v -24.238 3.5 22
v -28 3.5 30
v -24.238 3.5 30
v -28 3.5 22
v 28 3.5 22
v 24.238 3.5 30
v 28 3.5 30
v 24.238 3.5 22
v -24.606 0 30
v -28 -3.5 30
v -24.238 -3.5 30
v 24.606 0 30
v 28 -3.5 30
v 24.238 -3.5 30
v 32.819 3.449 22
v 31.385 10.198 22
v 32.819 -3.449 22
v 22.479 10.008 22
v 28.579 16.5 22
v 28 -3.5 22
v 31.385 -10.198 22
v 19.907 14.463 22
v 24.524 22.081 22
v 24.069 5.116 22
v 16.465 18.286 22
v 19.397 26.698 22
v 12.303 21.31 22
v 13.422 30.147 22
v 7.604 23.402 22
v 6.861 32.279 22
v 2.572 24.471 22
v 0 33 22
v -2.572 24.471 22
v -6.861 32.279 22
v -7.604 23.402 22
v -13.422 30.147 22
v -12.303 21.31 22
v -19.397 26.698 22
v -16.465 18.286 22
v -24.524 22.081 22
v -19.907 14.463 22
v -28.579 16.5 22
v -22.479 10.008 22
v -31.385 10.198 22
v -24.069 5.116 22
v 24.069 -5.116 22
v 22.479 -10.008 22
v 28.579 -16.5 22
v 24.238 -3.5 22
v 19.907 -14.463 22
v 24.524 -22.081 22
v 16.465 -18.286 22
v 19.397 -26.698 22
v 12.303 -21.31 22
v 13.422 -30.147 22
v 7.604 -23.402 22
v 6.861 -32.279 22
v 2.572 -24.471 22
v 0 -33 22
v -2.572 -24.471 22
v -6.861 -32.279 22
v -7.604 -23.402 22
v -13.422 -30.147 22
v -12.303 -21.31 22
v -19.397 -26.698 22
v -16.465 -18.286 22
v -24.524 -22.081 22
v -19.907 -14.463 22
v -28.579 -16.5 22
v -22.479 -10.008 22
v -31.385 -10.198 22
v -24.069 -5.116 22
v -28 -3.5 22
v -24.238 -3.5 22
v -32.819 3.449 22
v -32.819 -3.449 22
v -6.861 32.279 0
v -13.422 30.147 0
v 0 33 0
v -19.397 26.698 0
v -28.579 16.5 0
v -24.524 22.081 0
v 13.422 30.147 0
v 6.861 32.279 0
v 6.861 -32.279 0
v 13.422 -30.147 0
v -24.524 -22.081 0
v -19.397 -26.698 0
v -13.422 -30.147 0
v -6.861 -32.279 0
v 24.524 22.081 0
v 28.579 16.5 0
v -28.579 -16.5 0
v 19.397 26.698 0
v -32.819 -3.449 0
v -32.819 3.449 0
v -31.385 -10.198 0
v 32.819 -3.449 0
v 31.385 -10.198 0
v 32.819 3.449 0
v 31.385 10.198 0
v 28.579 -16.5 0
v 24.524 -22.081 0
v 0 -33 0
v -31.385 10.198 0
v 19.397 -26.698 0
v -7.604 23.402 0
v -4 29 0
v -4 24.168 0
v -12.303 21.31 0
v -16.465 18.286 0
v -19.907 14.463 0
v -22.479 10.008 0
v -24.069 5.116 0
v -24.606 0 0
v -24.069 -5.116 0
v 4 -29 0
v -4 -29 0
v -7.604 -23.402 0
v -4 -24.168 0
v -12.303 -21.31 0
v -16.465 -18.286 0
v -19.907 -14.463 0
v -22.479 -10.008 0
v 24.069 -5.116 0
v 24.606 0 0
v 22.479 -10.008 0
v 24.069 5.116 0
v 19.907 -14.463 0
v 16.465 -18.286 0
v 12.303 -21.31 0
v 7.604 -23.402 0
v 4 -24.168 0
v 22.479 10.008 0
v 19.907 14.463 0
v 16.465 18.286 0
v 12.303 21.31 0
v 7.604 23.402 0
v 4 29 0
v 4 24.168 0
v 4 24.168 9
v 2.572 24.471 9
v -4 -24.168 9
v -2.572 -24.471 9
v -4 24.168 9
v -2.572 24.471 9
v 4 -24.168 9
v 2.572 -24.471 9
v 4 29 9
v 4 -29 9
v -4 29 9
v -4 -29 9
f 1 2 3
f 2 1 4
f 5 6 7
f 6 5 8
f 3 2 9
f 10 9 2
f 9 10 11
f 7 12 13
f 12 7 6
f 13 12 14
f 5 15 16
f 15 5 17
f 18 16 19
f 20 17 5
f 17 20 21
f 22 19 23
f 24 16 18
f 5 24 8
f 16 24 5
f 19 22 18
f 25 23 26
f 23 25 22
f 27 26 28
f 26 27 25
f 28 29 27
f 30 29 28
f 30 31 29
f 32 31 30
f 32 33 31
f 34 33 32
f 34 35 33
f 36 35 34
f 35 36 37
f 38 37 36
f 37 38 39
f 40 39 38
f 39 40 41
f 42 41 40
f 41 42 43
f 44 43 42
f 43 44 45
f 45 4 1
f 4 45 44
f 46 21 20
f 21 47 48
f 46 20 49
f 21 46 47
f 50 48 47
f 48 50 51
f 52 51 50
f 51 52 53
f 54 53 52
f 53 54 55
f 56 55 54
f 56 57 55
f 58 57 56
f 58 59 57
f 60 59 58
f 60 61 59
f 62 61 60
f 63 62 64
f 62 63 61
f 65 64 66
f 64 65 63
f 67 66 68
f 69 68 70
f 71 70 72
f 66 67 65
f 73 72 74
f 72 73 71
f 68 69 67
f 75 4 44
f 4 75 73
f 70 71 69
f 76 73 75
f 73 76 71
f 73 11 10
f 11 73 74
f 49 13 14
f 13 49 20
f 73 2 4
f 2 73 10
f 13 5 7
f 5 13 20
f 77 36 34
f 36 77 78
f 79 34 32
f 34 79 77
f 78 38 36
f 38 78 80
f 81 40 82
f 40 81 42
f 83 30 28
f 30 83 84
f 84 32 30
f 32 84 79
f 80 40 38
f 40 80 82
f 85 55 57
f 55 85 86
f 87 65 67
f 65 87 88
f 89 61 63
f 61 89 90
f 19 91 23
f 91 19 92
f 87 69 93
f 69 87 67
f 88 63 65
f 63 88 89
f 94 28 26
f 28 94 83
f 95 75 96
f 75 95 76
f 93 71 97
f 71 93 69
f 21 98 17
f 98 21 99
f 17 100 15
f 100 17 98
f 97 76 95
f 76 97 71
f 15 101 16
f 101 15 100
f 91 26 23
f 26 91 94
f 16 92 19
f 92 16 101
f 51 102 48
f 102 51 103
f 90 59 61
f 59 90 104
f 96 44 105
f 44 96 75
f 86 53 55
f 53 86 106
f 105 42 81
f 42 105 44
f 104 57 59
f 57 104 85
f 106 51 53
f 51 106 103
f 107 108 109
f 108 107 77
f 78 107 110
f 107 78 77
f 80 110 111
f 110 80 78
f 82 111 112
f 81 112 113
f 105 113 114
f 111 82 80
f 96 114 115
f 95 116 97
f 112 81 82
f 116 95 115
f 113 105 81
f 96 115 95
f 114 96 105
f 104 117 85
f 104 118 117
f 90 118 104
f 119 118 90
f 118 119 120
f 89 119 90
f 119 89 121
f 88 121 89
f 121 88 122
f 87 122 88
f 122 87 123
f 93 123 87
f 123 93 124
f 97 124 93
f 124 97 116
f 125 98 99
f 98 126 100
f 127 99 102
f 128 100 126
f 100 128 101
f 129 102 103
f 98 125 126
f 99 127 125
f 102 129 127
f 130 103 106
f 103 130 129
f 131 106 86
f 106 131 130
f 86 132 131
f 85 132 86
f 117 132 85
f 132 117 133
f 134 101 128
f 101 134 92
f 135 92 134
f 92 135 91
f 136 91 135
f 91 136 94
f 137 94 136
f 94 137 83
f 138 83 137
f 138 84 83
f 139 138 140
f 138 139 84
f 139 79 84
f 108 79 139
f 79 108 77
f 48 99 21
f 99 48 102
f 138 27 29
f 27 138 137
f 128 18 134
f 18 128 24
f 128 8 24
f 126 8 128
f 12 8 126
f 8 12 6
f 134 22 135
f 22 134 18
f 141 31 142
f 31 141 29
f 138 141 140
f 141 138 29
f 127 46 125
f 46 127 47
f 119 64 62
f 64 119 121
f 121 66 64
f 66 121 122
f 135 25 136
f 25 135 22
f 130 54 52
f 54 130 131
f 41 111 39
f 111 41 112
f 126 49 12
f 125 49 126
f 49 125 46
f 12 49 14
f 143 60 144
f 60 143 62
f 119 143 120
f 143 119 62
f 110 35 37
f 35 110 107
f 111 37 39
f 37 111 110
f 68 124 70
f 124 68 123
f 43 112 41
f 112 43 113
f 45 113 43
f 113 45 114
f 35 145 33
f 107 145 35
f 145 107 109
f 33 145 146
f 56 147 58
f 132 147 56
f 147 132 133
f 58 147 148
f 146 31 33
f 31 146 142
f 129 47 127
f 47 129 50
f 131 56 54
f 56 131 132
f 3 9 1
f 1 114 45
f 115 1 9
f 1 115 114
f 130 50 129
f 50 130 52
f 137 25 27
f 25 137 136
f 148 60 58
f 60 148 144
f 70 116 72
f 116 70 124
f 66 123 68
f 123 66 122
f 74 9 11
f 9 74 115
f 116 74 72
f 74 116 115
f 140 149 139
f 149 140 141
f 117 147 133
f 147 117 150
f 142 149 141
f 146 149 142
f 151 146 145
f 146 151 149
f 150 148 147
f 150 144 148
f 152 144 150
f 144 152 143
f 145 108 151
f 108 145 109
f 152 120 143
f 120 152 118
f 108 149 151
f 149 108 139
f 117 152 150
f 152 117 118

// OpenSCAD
// file: shapes.scad
/*
 *  OpenSCAD Shapes Library (www.openscad.at)
 *  Copyright (C) 2009  Catarina Mota <clifford@clifford.at>
 *
 *  This program is free software; you can redistribute it and/or modify
 *  it under the terms of the GNU General Public License as published by
 *  the Free Software Foundation; either version 2 of the License, or
 *  (at your option) any later version.
 *
 *  This program is distributed in the hope that it will be useful,
 *  but WITHOUT ANY WARRANTY; without even the implied warranty of
 *  MERCHANTABILITY or FITNESS FOR A PARTICULAR PURPOSE.  See the
 *  GNU General Public License for more details.
 *
 *  You should have received a copy of the GNU General Public License
 *  along with this program; if not, write to the Free Software
 *  Foundation, Inc., 59 Temple Place, Suite 330, Boston, MA  02111-1307  USA
 *
*/


//box(width, height, depth);
//roundedBox(width, height, depth, factor);
//cone(height, radius);
//oval(width, height, depth);
//tube(height, radius, wall);
//ovalTube(width, height, depth, wall);
//hexagon(height, depth);
//octagon(height, depth);
//dodecagon(height, depth);
//hexagram(height, depth);
//rightTriangle(adjacent, opposite, depth);
//equiTriangle(side, depth);
//12ptStar(height, depth);

//----------------------

//roundedBox(120, 60, 3, 8);

//----------------------

module box(w,h,d) {
	scale ([w,h,d]) cube(1, true);
}

module roundedBox(w,h,d,f){
	difference(){
		box(w,h,d);
		translate([-w/2,h/2,0]) cube(w/(f/2),true);
		translate([w/2,h/2,0]) cube(w/(f/2),true);
		translate([-w/2,-h/2,0]) cube(w/(f/2),true);
		translate([w/2,-h/2,0]) cube(w/(f/2),true);
	}
	translate([-w/2+w/f,h/2-w/f,-d/2]) cylinder(d,w/f, w/f);
	translate([w/2-w/f,h/2-w/f,-d/2]) cylinder(d,w/f, w/f);
	translate([-w/2+w/f,-h/2+w/f,-d/2]) cylinder(d,w/f, w/f);
	translate([w/2-w/f,-h/2+w/f,-d/2]) cylinder(d,w/f, w/f);
}

module cone(height, radius) {
		cylinder(height, radius, 0);
}

module oval(w,h,d) {
	scale ([w/100, h/100, 1]) cylinder(d, 50, 50);
}

module tube(height, radius, wall) {
	difference(){
		cylinder(height, radius, radius);
		cylinder(height, radius-wall, radius-wall);
	}
}

module ovalTube(w,h,d,wall) {
	difference(){
		scale ([w/100, h/100, 1]) cylinder(d, 50, 50);
		scale ([w/100, h/100, 1]) cylinder(d, 50-wall, 50-wall);
	}
}

module hexagon(height, depth) {
	boxWidth=height/1.75;
		union(){
			box(boxWidth, height, depth);
			rotate([0,0,60]) box(boxWidth, height, depth);
			rotate([0,0,-60]) box(boxWidth, height, depth);
		}
}

module octagon(height, depth) {
	intersection(){
		box(height, height, depth);
		rotate([0,0,45]) box(height, height, depth);
	}
}

module dodecagon(height, depth) {
	intersection(){
		hexagon(height, depth);
		rotate([0,0,90]) hexagon(height, depth);
	}
}

module hexagram(height, depth) {
	boxWidth=height/1.75;
	intersection(){
		box(height, boxWidth, depth);
		rotate([0,0,60]) box(height, boxWidth, depth);
	}
	intersection(){
		box(height, boxWidth, depth);
		rotate([0,0,-60]) box(height, boxWidth, depth);
	}
	intersection(){
		rotate([0,0,60]) box(height, boxWidth, depth);
		rotate([0,0,-60]) box(height, boxWidth, depth);
	}
}

module rightTriangle(adjacent, opposite, depth) {
	difference(){
		translate([-adjacent/2,opposite/2,0]) box(adjacent, opposite, depth);
		translate([-adjacent,0,0]){
			rotate([0,0,atan(opposite/adjacent)]) dislocateBox(adjacent*2, opposite, depth);
		}
	}
}

module equiTriangle(side, depth) {
	difference(){
		translate([-side/2,side/2,0]) box(side, side, depth);
		rotate([0,0,30]) dislocateBox(side*2, side, depth);
		translate([-side,0,0]){
			rotate([0,0,60]) dislocateBox(side*2, side, depth);
		}
	}
}

module 12ptStar(height, depth) {
	starNum=3;
	starAngle=360/starNum;
	for (s=[1:starNum]){
		rotate([0, 0, s*starAngle]) box(height, height, depth);
	}
}

//-----------------------
//MOVES THE ROTATION AXIS OF A BOX FROM ITS CENTER TO THE BOTTOM LEFT CORNER
module dislocateBox(w,h,d){
	translate([w/2,h,0]){
		difference(){
			box(w, h*2, d+1);
			translate([-w,0,0]) box(w, h*2, d+1);
		}
	}
}
// main file
include <shapes.scad>  // using Catarina Mota's shapes library

boxheight = 22;
boxwidth = 82;
insideradius = ((((15/16)+1) * 25.4) / 2);
connectorheight = 8;
connectorwidth = 7;
smaller = 8;
difference ()
{
	rotate ([0,0,90]) union()
	{
		translate ([-connectorwidth/2,-(boxwidth-(smaller*3+2))/2,boxheight]) cube ([connectorwidth, boxwidth-(smaller*3+2), connectorheight]);
		translate ([0,0,0]) cylinder (h=boxheight, r = (boxwidth/2)-smaller);
	}
	translate ([0,0,0]) cylinder (h=(boxheight+connectorheight), r = insideradius, $fn=30);
	translate ([-(connectorwidth+1)/2,-(boxwidth-(smaller*3))/2,0]) cube ([connectorwidth+1, boxwidth-(3*smaller), connectorheight+1]);
}
